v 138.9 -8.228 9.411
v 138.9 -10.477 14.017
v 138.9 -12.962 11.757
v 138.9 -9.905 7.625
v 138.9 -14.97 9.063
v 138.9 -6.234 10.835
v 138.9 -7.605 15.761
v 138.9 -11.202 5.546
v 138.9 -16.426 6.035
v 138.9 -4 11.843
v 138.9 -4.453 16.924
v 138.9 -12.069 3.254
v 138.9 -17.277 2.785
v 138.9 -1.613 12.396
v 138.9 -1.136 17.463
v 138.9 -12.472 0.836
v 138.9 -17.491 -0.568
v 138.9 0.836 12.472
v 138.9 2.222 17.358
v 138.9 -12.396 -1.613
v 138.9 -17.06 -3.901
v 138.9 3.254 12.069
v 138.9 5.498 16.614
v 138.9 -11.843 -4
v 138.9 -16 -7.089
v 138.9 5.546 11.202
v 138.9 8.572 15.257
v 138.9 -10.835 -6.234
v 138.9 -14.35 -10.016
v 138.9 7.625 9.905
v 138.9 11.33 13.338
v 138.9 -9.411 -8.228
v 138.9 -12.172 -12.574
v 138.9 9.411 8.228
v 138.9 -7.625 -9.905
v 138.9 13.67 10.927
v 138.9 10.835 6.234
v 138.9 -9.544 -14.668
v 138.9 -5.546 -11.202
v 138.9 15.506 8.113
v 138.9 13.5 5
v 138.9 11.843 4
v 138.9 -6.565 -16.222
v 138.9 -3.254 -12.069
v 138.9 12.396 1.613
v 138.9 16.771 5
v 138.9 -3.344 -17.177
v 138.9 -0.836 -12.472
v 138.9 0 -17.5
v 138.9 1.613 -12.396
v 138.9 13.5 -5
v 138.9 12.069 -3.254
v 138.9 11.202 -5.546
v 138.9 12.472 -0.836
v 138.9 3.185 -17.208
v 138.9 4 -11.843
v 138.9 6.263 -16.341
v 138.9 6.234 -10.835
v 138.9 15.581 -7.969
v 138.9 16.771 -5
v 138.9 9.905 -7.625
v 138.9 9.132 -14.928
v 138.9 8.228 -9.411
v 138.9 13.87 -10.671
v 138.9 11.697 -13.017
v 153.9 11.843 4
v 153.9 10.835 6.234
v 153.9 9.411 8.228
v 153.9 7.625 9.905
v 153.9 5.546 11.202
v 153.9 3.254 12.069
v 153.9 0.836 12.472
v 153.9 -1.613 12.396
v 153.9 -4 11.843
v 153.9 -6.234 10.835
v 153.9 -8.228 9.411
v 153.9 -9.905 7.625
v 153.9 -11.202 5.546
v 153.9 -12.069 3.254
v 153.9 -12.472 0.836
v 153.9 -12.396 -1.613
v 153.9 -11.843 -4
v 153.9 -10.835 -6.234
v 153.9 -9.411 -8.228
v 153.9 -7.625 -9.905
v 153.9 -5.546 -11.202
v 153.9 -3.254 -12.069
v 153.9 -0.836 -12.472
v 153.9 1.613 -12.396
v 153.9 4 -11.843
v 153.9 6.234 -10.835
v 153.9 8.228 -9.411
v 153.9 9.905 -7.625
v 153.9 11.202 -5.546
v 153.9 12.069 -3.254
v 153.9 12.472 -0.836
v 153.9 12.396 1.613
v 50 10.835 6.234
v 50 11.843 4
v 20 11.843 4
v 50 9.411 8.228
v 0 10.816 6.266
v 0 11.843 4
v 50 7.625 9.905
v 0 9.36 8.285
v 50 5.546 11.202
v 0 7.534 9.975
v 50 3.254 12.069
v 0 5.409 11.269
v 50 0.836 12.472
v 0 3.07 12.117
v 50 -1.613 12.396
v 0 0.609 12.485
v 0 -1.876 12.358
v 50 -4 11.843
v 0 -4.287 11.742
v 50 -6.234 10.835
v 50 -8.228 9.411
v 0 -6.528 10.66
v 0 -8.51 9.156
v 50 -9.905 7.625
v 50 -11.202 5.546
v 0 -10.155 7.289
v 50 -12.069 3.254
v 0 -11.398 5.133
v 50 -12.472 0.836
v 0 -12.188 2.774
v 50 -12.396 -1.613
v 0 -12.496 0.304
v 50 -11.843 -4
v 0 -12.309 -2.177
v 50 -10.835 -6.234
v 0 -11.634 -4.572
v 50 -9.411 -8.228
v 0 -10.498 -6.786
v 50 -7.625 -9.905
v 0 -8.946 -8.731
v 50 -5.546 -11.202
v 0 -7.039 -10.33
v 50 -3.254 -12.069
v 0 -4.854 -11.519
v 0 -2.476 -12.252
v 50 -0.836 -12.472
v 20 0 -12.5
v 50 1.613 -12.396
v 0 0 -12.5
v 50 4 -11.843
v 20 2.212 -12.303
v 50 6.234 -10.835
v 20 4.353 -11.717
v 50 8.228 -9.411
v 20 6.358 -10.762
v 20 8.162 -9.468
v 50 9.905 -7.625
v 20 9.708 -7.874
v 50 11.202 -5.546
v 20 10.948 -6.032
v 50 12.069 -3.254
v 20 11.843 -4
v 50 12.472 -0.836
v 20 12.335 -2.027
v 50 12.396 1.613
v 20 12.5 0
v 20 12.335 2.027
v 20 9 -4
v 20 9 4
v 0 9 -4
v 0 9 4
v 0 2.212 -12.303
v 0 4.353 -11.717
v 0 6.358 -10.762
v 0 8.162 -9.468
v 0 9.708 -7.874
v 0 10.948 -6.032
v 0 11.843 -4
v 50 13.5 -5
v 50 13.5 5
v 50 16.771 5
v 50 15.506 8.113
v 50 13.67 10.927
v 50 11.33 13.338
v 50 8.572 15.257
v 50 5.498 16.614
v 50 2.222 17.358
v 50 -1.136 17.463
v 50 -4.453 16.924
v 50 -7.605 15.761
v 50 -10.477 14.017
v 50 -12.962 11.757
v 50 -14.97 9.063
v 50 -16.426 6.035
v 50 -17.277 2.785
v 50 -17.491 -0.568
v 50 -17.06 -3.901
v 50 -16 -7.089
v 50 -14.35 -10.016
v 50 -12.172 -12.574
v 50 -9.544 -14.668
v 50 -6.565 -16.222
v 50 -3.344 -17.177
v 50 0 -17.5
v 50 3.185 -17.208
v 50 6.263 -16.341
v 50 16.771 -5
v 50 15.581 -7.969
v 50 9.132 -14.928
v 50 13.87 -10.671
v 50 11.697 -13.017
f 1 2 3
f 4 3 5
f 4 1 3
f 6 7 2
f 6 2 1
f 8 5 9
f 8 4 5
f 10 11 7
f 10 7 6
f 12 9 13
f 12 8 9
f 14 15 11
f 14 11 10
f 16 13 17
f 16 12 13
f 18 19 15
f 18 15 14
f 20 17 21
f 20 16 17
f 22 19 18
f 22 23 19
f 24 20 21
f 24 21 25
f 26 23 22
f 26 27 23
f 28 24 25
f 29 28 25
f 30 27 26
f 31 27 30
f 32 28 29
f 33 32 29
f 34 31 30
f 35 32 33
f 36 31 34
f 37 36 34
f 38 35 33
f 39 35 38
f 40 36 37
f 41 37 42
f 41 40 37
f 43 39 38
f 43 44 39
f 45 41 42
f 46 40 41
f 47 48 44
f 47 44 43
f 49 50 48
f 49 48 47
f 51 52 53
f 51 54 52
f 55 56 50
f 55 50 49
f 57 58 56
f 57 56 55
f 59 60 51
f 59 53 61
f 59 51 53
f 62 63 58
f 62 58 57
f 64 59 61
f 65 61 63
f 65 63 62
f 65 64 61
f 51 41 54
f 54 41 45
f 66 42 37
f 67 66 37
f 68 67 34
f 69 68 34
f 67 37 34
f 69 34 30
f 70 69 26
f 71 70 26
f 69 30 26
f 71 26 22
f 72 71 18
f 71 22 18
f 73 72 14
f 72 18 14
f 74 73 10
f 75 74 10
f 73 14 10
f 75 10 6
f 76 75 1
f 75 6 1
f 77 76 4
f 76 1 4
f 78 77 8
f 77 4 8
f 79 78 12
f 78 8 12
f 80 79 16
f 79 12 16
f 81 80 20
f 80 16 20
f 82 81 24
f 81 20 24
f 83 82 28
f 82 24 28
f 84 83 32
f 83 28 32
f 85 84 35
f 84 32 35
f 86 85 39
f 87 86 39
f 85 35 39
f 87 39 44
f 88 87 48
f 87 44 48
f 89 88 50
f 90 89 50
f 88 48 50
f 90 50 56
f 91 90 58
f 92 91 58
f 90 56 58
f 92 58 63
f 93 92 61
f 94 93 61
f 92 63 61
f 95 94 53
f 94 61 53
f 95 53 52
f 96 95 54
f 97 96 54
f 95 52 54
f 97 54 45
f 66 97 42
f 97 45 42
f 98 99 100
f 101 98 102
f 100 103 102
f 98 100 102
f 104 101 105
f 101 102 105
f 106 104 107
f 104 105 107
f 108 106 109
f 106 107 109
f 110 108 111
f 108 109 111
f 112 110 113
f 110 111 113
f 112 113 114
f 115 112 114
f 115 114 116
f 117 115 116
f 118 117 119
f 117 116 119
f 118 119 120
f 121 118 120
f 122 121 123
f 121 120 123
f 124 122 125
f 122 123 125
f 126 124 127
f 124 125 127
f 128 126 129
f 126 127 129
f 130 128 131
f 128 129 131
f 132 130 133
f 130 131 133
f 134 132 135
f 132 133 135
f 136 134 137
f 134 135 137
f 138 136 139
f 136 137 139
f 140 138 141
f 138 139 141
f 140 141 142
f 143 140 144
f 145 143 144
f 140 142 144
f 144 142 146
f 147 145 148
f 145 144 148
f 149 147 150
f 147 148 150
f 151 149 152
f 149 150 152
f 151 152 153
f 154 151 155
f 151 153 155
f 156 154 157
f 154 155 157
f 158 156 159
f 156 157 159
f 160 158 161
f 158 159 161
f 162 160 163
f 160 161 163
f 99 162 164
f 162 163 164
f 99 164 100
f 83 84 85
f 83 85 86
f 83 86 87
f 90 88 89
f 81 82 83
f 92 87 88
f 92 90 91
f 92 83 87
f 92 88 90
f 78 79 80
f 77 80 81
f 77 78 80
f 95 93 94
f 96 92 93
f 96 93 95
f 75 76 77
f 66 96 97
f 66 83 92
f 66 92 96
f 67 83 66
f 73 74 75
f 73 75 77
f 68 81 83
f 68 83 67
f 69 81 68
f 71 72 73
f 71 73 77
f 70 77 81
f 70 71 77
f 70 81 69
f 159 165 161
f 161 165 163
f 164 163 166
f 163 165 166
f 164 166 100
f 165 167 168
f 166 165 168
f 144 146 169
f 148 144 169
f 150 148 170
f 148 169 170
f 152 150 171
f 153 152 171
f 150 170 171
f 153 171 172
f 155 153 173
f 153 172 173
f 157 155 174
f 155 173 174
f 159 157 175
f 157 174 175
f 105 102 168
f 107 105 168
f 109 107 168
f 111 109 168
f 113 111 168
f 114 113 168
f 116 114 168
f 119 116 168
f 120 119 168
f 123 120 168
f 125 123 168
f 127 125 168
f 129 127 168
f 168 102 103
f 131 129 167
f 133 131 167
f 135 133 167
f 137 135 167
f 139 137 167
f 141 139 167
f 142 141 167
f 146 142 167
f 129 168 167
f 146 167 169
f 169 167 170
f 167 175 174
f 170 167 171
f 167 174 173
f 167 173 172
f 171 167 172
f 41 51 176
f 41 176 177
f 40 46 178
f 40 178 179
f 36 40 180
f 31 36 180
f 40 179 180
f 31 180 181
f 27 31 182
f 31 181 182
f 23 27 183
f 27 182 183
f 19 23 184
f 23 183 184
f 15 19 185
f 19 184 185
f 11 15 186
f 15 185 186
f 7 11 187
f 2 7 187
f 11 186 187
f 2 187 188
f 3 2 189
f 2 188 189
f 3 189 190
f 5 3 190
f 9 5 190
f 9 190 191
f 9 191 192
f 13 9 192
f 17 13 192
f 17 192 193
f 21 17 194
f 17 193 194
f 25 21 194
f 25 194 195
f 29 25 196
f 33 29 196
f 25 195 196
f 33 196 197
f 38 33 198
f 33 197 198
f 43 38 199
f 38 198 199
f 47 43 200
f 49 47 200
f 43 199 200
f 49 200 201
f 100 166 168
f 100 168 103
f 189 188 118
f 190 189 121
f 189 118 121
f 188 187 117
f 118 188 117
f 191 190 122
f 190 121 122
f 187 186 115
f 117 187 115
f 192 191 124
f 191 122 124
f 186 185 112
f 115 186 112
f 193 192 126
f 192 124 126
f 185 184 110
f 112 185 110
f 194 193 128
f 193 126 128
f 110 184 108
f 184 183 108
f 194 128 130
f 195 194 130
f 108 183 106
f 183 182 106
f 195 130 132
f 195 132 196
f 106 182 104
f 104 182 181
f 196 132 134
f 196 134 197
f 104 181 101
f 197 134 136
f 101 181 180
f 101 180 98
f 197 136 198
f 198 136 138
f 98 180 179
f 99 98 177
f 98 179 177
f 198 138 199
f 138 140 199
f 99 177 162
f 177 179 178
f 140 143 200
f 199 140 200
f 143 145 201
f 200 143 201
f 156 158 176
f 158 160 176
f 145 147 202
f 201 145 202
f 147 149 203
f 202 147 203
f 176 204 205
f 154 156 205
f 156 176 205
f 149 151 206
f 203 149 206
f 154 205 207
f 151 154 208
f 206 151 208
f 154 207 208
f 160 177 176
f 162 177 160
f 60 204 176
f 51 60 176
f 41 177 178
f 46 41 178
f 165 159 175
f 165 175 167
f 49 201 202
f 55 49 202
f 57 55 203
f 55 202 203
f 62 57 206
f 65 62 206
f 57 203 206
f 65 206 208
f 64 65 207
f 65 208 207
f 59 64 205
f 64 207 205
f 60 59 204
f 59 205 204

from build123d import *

# Parameters (mm, degrees)
BOSS_EXTRUDE1_DEPTH = 20
SKETCH2_R           = 12.5
BOSS_EXTRUDE2_DEPTH = 10
SKETCH3_R           = 12.5
BOSS_EXTRUDE3_DEPTH = 20
SKETCH4_R           = 12.5
BOSS_EXTRUDE6_DEPTH = 88.9
SKETCH6_R           = 12.5
BOSS_EXTRUDE7_DEPTH = 15


with BuildPart() as part:
    # Sketch1 → Boss-Extrude1 (new body)
    with BuildSketch(Plane(origin=(0, 0, 0), x_dir=(0, 0, -1), z_dir=(1, 0, 0))):
        with BuildLine():
            ThreePointArc((12.5, 0), (10.155048006, 7.288689869), (4, 11.842719282))
            Line((4, 11.842719282), (4, 9))
            Line((4, 9), (-4, 9))
            Line((-4, 9), (-4, 11.842719282))
            ThreePointArc((-4, 11.842719282), (-7.288689869, -10.155048006), (12.5, 0))
        make_face()
    extrude(amount=BOSS_EXTRUDE1_DEPTH)

    # Sketch2 → Boss-Extrude2 (add)
    with BuildSketch(Plane(origin=(20, 0, 0), x_dir=(0, 0, -1), z_dir=(1, 0, 0))):
        with Locations(Location((0, 0, 0), (0, 0, 108.662924885))):
            Circle(SKETCH2_R)
    extrude(amount=BOSS_EXTRUDE2_DEPTH)

    # Sketch3 → Boss-Extrude3 (add)
    with BuildSketch(Plane(origin=(30, 0, 0), x_dir=(0, 0, -1), z_dir=(1, 0, 0))):
        with Locations(Location((0, 0, 0), (0, 0, 108.662924885))):
            Circle(SKETCH3_R)
    extrude(amount=BOSS_EXTRUDE3_DEPTH)

    # Sketch4 → Boss-Extrude6 (add)
    with BuildSketch(Plane(origin=(50, 0, 0), x_dir=(0, 0, -1), z_dir=(1, 0, 0))):
        with BuildLine():
            ThreePointArc((17.5, 0), (14.0312152, 10.458250332), (5, 16.770509831))
            Line((5, 16.770509831), (5, 13.5))
            Line((5, 13.5), (-5, 13.5))
            Line((-5, 13.5), (-5, 16.770509831))
            ThreePointArc((-5, 16.770509831), (-10.458250332, -14.0312152), (17.5, 0))
        make_face()
        with Locations(Location((0, 0, 0), (0, 0, 108.662924885))):
            Circle(SKETCH4_R, mode=Mode.SUBTRACT)
        with Locations(Location((0, 0, 0), (0, 0, 108.662924885))):
            Circle(SKETCH4_R)
    extrude(amount=BOSS_EXTRUDE6_DEPTH)

    # Sketch6 → Boss-Extrude7 (add)
    with BuildSketch(Plane(origin=(138.9, 0, 0), x_dir=(0, 0, -1), z_dir=(1, 0, 0))):
        with Locations(Location((0, 0, 0), (0, 0, 108.662924885))):
            Circle(SKETCH6_R)
    extrude(amount=BOSS_EXTRUDE7_DEPTH)


solid = part.part
